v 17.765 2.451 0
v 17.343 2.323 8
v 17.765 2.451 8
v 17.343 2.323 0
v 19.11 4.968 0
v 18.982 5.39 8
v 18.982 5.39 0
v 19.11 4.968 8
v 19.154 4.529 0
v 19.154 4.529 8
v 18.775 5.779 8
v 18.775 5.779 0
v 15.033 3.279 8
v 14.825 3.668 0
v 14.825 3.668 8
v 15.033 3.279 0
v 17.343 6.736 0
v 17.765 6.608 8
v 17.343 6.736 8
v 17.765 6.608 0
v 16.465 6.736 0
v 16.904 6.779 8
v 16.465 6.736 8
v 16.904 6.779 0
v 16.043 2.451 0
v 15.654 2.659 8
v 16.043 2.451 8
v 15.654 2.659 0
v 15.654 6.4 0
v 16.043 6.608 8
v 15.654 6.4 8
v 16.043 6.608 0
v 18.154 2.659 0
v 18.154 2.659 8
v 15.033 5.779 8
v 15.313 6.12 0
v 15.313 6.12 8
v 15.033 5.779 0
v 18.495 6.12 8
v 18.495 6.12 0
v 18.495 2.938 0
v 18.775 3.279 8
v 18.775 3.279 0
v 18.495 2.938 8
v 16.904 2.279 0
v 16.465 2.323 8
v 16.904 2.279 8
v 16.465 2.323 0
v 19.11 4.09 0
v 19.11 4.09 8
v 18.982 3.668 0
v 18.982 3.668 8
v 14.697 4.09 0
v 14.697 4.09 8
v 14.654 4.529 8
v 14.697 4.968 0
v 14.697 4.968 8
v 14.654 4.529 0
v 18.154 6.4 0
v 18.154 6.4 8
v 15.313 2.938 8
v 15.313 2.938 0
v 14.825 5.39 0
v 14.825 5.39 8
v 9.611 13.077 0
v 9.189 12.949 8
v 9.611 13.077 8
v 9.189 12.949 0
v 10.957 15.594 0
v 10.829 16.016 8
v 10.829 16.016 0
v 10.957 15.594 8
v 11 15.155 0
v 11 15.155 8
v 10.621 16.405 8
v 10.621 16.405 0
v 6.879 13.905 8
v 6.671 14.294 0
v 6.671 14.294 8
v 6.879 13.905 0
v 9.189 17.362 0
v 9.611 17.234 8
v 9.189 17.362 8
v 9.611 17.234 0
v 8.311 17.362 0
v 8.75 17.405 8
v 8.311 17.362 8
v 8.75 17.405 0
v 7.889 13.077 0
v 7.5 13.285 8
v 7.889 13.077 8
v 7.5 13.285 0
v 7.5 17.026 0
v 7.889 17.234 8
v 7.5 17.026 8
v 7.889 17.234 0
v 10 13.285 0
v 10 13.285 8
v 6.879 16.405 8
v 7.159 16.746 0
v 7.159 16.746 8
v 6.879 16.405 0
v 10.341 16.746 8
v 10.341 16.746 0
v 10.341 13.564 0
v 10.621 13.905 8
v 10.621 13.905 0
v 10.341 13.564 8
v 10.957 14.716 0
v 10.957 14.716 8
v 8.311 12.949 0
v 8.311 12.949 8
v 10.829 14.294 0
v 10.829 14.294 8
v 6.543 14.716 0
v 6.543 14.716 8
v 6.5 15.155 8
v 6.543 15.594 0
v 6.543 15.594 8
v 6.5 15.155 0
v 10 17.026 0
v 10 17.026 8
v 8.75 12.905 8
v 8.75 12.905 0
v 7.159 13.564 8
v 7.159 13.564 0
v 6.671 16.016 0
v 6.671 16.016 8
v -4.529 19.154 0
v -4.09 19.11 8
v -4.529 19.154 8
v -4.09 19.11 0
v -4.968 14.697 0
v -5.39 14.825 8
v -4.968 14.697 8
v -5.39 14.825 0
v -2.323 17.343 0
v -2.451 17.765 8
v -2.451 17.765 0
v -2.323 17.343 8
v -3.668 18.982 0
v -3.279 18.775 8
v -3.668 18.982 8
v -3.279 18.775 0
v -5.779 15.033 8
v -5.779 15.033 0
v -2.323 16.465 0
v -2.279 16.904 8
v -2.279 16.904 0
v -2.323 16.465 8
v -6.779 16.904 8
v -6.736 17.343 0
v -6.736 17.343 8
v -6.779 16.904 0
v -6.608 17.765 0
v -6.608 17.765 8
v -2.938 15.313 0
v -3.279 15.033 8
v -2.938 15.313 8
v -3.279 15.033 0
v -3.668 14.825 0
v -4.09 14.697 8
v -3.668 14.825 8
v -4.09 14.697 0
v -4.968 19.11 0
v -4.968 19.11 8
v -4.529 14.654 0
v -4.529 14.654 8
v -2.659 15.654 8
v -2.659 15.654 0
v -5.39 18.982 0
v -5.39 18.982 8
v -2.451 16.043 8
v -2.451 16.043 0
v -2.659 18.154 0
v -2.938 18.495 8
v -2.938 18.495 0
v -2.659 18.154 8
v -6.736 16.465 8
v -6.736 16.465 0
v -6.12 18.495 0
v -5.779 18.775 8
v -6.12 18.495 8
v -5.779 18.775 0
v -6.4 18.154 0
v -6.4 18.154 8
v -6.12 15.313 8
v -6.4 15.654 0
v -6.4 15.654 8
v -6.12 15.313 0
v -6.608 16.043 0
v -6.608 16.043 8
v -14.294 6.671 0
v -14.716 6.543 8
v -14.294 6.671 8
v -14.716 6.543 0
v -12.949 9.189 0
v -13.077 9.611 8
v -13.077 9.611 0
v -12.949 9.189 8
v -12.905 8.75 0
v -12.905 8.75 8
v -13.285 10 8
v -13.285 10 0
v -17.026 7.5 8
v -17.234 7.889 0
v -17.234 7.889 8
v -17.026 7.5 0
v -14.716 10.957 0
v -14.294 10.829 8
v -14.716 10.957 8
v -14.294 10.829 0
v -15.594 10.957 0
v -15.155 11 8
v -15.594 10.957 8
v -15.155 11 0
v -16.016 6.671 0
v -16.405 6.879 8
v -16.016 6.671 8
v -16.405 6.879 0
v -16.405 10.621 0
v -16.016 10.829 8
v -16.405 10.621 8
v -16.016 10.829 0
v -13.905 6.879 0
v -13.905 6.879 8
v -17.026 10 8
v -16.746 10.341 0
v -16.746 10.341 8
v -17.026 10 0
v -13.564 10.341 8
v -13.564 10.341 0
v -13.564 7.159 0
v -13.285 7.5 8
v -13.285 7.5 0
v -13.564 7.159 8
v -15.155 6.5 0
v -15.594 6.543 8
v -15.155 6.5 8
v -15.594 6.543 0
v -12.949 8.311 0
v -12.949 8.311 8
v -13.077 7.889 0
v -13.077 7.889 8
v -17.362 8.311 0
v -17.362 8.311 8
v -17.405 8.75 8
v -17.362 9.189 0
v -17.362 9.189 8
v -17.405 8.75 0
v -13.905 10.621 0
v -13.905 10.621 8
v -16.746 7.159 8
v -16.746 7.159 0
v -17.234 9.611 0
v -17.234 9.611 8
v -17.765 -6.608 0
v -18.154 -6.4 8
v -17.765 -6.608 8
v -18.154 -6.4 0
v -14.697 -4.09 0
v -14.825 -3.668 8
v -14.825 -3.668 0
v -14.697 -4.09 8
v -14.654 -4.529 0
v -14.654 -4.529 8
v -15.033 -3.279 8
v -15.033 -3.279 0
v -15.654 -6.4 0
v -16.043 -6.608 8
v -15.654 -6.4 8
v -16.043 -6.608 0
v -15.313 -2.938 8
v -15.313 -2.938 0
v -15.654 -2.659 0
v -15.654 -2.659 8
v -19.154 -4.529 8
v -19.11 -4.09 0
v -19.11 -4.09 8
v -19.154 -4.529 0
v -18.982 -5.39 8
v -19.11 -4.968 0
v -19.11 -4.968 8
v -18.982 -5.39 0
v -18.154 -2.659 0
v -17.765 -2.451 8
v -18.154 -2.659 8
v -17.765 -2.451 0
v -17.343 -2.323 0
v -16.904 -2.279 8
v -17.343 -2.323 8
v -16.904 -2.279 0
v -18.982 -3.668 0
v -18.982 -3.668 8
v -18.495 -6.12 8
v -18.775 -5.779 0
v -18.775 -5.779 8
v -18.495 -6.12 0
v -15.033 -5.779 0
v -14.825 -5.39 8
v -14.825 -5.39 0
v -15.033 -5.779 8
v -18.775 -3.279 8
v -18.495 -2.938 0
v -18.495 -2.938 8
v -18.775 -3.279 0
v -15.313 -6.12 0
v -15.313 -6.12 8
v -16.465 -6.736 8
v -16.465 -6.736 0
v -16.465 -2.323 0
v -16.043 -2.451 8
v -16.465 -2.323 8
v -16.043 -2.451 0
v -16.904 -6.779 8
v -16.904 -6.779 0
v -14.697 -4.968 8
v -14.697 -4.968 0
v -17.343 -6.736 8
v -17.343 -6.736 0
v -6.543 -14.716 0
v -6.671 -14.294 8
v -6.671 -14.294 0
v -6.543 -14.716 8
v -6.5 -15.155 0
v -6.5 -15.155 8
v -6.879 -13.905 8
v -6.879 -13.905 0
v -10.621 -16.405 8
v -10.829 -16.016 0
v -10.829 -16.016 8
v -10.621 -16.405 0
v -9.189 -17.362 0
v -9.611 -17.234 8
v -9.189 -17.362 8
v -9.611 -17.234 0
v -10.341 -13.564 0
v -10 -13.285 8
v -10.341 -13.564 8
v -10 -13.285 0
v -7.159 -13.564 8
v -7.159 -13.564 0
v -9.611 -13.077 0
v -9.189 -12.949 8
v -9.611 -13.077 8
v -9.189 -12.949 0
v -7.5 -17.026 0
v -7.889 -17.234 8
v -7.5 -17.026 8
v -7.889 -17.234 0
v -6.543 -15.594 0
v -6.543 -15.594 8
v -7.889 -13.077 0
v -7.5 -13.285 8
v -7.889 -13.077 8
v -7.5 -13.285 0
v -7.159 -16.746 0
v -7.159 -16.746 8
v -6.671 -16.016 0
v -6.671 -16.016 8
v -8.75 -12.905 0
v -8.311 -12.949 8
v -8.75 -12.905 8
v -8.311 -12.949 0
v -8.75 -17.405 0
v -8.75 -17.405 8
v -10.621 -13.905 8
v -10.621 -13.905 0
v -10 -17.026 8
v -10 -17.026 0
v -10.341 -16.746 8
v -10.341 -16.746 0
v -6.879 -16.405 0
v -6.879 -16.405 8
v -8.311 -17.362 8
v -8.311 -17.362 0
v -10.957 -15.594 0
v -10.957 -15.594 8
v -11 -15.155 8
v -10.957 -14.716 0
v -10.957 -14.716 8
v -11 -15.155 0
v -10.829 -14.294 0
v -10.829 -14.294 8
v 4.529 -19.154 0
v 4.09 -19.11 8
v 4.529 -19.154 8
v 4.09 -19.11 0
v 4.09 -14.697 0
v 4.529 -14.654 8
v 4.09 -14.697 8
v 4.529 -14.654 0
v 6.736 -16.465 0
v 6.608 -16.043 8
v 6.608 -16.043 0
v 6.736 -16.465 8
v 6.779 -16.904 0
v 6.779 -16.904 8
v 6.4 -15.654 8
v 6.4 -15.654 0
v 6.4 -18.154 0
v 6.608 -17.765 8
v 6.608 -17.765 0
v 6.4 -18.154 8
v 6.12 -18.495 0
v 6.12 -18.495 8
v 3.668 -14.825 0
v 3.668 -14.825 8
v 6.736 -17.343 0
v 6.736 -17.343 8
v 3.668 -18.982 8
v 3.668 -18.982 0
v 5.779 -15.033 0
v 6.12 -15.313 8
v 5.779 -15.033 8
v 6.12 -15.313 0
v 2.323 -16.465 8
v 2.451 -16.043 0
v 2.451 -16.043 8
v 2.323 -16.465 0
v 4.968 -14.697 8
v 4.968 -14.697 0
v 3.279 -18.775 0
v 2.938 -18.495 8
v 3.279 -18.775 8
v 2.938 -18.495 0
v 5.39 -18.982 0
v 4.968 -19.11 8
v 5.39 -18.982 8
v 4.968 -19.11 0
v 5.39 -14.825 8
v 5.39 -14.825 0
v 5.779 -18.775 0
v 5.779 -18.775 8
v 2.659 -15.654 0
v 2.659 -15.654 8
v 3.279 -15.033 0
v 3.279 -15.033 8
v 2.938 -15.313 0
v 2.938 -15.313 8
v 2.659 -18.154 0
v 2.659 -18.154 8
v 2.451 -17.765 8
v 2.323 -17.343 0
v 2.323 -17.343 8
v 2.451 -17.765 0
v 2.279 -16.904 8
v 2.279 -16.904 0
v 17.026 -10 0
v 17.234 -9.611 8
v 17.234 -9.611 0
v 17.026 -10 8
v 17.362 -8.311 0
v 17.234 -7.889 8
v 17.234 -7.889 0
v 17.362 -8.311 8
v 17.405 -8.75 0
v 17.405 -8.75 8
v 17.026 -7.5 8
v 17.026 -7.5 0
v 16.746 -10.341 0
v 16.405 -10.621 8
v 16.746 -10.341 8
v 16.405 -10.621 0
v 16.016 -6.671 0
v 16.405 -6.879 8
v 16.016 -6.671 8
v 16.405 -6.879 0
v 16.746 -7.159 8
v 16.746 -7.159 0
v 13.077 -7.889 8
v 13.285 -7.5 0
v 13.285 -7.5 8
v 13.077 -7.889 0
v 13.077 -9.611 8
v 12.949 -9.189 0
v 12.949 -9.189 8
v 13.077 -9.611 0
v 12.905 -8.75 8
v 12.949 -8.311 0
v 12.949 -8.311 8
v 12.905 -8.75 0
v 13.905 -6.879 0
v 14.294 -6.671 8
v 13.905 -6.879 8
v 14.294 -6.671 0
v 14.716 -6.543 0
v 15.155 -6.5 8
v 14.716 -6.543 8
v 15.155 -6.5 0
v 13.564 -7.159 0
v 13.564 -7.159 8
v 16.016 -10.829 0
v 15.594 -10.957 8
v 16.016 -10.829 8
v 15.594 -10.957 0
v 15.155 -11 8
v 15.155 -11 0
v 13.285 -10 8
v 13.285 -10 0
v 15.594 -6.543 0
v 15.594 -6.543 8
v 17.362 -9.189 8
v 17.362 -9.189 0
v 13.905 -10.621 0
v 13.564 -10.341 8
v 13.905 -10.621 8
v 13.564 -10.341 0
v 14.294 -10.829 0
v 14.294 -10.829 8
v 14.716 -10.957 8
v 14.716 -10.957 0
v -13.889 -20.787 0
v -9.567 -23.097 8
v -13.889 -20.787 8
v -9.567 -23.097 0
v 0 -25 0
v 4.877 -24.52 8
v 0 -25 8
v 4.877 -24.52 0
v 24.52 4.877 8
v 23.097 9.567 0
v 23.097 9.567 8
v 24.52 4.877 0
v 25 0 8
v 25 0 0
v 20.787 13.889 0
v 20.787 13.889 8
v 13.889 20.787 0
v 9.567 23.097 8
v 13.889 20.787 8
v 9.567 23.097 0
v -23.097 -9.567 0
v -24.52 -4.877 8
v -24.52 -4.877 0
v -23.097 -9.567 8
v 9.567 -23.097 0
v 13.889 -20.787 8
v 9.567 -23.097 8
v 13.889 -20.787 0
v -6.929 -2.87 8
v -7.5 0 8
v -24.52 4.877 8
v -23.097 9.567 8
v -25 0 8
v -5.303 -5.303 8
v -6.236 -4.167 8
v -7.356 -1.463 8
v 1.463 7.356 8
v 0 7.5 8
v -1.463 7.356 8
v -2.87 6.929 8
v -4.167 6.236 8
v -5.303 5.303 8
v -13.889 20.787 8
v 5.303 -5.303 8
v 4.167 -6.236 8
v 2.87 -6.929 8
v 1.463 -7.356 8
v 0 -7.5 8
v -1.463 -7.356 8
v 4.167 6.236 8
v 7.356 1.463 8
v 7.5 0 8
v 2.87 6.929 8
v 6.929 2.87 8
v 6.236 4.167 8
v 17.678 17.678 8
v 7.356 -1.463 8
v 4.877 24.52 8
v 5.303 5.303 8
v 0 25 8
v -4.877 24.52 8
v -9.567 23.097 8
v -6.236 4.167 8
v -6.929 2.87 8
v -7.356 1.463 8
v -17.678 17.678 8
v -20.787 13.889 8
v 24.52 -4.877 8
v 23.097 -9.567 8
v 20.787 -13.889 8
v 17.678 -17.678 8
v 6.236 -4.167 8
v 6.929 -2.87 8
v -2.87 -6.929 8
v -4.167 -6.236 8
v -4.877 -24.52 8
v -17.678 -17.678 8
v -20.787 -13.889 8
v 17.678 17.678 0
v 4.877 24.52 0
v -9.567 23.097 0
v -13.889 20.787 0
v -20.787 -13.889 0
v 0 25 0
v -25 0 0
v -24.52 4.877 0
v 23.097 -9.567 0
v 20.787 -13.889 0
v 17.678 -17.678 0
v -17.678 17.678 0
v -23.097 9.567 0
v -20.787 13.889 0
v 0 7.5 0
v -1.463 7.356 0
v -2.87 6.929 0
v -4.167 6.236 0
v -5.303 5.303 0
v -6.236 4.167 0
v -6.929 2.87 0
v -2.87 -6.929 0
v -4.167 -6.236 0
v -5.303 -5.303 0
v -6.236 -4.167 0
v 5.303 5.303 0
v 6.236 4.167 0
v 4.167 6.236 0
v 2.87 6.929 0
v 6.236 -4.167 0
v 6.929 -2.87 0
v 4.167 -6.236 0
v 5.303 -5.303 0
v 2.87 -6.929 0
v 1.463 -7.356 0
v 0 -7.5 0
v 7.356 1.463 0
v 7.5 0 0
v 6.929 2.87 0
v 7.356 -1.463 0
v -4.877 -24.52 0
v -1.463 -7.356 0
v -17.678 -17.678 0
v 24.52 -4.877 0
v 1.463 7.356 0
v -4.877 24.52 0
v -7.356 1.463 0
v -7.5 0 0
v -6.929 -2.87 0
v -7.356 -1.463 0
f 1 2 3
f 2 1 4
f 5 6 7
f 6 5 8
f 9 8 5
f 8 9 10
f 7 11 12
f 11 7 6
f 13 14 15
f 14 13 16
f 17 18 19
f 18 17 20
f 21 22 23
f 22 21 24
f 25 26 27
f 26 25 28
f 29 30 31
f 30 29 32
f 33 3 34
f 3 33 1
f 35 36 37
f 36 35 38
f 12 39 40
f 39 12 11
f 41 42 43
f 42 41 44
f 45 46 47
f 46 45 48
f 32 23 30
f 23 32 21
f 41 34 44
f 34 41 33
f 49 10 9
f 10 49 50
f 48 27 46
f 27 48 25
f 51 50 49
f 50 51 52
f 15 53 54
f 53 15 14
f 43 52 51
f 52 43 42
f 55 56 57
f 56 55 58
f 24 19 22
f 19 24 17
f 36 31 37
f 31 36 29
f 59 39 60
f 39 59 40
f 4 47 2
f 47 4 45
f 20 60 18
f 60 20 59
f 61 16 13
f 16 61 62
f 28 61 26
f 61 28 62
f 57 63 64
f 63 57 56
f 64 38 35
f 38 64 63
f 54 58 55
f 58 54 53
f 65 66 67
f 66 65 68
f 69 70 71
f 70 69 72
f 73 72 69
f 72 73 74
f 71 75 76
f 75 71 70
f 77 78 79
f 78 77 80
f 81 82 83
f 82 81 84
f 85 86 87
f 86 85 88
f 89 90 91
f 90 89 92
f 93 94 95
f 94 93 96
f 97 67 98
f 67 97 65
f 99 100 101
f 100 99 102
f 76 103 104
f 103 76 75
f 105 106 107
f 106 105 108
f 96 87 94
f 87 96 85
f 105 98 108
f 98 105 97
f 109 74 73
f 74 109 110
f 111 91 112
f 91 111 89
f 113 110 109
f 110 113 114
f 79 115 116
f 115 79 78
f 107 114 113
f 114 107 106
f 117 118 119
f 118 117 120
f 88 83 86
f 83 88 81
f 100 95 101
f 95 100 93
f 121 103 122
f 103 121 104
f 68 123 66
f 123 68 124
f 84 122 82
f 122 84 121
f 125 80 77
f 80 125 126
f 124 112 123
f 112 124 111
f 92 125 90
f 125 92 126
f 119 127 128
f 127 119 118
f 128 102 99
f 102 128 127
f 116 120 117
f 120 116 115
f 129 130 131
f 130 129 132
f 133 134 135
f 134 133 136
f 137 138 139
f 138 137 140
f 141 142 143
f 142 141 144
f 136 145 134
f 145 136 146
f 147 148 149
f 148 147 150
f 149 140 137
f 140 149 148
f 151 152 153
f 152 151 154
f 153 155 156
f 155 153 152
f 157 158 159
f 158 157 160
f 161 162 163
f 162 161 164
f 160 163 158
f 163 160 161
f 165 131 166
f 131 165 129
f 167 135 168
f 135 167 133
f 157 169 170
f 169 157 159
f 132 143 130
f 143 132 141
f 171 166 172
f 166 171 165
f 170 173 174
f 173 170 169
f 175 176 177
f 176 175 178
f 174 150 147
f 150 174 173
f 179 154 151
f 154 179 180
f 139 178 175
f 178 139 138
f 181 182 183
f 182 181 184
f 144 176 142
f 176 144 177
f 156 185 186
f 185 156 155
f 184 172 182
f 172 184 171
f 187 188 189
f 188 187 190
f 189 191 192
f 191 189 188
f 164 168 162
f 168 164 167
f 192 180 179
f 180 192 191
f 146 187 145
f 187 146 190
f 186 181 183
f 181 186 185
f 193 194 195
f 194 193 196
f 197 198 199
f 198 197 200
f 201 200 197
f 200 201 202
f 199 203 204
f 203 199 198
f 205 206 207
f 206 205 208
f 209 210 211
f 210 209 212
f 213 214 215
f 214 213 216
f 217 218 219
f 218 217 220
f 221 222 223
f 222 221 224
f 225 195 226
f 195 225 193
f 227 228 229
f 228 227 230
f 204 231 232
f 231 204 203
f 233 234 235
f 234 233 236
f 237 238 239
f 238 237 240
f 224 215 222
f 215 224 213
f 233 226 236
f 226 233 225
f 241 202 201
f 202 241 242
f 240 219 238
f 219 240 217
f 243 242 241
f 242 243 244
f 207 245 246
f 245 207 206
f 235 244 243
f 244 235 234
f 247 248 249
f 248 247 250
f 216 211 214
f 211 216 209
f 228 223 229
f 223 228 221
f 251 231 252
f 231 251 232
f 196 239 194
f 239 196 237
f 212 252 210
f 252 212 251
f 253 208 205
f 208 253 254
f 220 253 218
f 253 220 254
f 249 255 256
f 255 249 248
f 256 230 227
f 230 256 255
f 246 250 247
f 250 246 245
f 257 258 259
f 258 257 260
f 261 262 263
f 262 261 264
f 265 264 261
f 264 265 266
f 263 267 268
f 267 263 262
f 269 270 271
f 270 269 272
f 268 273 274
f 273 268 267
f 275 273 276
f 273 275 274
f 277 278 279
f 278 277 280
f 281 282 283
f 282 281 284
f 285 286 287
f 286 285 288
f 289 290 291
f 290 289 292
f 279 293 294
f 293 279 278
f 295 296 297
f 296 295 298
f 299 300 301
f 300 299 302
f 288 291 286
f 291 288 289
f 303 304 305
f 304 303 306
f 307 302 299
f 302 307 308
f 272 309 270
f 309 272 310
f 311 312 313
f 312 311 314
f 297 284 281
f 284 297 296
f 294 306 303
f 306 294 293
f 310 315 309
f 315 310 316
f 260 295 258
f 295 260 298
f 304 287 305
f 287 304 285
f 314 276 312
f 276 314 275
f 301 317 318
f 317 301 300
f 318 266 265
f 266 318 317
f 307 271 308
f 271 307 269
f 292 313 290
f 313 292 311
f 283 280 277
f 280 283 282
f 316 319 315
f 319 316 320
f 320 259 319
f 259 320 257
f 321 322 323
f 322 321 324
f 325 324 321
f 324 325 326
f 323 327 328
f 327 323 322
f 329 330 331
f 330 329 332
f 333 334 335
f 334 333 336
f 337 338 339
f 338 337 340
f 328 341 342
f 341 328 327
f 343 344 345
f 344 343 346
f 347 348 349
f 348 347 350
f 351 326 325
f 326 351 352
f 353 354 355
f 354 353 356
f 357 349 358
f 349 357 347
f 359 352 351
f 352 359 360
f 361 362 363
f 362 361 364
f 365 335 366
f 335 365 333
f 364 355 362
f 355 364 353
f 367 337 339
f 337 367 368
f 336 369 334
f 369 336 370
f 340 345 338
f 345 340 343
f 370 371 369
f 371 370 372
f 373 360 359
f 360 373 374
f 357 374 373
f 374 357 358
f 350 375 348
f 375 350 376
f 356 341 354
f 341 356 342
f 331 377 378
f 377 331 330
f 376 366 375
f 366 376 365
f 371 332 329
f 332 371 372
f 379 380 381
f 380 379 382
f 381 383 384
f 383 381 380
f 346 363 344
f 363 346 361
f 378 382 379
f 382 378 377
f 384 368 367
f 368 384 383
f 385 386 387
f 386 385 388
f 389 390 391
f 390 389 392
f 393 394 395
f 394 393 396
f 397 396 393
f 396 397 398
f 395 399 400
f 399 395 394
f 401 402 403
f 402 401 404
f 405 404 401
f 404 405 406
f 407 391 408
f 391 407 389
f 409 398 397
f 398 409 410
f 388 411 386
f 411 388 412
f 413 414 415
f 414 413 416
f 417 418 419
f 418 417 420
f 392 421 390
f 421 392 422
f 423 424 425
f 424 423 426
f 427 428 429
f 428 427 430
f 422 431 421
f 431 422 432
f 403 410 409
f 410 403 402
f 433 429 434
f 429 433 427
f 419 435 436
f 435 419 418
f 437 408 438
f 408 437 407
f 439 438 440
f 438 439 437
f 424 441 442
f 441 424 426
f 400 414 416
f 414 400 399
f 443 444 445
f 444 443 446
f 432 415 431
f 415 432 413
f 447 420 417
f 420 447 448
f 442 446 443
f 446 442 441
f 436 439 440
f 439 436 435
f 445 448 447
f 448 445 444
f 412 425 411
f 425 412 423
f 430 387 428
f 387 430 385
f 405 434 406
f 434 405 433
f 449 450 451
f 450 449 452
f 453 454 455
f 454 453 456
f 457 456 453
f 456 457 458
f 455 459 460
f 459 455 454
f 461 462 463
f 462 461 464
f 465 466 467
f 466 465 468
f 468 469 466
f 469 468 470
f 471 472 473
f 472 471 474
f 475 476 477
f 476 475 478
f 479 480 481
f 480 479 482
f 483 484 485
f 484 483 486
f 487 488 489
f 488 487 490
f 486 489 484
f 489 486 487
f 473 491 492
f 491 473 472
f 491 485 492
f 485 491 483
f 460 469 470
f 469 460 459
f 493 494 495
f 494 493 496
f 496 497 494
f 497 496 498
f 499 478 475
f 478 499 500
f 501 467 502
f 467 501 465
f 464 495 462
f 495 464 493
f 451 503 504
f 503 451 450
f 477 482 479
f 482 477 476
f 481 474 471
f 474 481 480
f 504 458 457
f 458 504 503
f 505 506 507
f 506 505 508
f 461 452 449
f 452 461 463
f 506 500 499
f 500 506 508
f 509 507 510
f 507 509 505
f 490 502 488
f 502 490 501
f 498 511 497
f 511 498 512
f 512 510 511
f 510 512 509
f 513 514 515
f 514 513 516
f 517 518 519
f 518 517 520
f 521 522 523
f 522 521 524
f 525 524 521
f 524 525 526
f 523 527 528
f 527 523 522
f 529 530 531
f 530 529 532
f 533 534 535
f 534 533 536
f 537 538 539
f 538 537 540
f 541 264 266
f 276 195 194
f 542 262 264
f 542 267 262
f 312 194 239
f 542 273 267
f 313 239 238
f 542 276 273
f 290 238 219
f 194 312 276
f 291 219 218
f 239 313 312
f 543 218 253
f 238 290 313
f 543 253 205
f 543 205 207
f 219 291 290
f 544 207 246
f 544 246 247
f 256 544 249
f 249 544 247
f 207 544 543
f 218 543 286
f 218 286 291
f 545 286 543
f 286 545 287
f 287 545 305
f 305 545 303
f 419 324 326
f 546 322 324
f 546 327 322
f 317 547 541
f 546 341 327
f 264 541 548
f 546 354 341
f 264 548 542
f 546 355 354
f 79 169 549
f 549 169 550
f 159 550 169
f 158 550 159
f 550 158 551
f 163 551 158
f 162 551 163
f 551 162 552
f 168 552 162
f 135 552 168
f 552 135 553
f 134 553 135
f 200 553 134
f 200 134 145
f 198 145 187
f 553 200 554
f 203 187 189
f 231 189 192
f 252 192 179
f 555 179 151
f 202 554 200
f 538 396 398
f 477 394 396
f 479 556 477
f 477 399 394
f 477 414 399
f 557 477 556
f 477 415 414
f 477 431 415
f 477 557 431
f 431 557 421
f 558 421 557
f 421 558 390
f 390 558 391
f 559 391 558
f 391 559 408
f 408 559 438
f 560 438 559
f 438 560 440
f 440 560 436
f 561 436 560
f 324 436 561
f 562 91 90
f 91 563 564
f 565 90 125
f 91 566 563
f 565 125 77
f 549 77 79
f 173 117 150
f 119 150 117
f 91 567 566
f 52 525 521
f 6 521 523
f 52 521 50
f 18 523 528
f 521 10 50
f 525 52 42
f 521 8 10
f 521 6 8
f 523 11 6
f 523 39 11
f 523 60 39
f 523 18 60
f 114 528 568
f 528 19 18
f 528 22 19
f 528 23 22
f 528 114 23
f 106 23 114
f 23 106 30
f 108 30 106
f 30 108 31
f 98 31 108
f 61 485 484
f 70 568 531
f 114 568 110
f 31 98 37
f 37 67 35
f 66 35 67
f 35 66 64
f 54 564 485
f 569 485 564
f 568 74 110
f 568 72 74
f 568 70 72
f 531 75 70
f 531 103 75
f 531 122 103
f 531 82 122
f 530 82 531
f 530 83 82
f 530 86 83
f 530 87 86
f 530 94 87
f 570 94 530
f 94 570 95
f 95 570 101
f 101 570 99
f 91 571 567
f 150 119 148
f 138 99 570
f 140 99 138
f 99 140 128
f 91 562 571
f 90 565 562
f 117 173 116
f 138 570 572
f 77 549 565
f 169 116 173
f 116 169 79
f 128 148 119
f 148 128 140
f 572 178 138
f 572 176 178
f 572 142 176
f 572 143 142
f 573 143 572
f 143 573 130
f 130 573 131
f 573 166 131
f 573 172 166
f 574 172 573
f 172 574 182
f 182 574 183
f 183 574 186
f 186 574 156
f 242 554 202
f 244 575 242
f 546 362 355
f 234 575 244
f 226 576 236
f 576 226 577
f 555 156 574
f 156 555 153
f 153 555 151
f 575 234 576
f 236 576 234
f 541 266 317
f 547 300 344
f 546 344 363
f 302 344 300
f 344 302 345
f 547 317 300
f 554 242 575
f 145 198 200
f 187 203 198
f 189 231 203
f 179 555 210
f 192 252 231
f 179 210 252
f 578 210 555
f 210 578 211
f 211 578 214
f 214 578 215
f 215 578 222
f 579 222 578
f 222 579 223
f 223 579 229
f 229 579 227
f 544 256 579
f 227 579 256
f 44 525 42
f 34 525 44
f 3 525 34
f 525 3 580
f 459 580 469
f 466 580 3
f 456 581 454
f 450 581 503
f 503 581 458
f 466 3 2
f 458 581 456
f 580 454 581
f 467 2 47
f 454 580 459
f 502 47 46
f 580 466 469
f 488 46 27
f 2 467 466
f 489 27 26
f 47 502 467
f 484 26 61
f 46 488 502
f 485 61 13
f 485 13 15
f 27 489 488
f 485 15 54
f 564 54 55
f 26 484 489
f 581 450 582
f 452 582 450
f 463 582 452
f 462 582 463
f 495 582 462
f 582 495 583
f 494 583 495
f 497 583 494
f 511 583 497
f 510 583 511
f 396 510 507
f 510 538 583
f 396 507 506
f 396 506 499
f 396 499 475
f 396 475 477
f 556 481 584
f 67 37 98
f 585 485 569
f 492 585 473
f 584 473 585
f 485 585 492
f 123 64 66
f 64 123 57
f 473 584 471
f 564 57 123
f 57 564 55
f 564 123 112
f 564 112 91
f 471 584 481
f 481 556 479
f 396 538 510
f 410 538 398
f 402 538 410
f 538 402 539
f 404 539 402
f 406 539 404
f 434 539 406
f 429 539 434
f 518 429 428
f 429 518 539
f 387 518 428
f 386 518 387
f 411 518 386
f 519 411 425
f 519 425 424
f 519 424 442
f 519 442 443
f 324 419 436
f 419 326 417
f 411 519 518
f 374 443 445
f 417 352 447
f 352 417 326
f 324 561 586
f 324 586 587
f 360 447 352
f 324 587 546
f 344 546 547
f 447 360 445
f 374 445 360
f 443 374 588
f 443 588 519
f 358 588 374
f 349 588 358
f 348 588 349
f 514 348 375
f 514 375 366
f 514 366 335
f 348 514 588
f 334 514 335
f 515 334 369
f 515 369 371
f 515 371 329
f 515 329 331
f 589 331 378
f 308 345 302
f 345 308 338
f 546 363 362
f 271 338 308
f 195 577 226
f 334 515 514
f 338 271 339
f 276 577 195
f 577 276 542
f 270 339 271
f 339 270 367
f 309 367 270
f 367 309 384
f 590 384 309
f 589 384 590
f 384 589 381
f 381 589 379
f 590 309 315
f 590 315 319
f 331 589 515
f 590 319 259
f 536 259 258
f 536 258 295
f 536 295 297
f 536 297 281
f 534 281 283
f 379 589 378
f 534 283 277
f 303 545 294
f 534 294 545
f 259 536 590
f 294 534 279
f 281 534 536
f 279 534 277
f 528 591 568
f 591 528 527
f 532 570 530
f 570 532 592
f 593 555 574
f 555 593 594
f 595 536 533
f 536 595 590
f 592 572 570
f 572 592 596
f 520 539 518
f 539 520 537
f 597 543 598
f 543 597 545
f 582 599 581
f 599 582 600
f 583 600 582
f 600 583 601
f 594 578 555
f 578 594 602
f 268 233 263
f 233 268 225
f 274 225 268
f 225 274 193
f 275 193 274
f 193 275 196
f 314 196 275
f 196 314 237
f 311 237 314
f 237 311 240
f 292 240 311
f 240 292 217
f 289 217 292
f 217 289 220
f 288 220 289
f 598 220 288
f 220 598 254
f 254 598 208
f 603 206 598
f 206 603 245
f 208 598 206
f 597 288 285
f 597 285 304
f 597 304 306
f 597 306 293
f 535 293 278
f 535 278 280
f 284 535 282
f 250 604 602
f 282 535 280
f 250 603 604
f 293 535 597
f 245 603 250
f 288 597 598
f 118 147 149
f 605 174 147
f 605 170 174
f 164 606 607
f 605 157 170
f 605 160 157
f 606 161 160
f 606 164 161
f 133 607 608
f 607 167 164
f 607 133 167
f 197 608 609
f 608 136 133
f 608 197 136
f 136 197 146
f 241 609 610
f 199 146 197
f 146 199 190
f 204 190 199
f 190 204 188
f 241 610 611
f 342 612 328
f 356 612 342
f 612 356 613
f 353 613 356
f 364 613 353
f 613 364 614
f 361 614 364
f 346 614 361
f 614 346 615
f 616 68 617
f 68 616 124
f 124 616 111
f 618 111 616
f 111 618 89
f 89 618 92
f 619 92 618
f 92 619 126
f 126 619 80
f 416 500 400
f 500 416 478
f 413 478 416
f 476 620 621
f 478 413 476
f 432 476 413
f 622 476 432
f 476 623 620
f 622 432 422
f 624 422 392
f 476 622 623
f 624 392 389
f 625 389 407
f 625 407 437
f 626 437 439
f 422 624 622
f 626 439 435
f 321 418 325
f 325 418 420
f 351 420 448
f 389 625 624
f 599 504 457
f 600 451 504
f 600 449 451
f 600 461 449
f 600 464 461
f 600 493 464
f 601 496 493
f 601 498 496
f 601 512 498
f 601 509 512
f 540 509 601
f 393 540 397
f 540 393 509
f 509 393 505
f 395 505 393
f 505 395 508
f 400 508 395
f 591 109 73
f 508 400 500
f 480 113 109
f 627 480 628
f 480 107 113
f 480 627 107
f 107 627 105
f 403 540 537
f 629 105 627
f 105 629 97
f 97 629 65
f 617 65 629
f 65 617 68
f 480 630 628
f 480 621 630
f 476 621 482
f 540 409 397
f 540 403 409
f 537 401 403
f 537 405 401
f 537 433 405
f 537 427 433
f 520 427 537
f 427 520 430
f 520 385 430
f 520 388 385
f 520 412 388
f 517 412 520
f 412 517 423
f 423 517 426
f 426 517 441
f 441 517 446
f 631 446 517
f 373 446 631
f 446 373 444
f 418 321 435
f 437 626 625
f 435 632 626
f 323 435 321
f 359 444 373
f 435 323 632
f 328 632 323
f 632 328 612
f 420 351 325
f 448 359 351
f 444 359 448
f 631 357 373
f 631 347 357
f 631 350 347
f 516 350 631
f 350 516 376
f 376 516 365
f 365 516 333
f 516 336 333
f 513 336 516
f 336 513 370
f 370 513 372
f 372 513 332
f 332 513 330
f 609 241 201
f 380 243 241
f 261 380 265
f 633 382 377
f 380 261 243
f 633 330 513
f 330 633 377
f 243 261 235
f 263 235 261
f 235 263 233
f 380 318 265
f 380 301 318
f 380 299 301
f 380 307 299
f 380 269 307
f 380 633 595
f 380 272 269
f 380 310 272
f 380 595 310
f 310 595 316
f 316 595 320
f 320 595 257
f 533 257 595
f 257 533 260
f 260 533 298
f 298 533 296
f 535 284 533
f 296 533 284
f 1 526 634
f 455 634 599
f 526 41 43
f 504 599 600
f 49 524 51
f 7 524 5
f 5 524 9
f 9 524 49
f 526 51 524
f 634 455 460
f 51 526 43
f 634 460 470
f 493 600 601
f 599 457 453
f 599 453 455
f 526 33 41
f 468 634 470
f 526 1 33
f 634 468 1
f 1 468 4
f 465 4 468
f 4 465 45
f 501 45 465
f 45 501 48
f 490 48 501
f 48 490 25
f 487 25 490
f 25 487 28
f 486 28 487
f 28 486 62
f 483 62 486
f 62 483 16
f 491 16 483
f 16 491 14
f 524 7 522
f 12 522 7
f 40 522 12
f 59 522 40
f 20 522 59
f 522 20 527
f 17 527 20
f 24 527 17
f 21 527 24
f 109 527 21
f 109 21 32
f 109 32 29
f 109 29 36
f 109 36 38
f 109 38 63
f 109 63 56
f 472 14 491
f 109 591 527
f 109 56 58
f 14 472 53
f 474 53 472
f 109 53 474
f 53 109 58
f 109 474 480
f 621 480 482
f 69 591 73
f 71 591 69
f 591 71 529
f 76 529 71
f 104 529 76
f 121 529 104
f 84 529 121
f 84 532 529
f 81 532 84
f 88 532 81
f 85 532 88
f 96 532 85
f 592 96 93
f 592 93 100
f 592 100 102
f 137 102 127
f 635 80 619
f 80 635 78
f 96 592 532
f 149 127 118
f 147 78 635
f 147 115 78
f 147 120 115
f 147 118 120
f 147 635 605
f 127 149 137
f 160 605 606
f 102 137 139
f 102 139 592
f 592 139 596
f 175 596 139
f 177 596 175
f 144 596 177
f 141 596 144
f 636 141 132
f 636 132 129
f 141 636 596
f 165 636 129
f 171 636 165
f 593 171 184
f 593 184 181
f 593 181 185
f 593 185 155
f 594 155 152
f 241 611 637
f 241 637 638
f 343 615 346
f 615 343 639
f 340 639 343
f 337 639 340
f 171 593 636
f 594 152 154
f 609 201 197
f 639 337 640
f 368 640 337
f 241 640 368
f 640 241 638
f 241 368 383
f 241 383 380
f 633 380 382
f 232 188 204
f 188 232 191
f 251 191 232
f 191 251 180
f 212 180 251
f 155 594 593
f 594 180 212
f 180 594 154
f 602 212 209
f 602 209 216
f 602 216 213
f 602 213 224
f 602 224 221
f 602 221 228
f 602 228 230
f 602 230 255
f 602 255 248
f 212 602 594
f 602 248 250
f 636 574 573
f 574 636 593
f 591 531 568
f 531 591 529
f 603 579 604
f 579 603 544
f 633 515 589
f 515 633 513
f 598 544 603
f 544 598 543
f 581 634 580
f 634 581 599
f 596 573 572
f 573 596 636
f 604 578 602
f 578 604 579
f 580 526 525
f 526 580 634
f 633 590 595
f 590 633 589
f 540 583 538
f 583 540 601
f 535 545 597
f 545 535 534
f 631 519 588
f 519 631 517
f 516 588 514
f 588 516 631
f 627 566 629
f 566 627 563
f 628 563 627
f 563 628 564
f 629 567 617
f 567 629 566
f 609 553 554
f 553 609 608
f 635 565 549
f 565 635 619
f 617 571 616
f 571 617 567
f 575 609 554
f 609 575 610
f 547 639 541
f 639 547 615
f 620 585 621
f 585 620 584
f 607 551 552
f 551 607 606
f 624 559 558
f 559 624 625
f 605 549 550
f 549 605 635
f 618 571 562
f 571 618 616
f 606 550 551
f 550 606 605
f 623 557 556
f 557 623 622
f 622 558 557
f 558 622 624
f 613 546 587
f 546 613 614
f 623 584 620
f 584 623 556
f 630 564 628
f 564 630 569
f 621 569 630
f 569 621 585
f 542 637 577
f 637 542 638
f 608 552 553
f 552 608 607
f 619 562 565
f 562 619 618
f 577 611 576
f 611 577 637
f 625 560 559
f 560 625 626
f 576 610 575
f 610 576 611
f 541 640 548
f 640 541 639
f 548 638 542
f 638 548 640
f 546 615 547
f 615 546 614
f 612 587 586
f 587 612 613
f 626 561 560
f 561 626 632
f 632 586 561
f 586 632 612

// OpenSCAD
$fn = 32;

// ----------------------------------------------------------------------
// Flange Ø50 x 8
// 8 holes on a Ø35 bolt circle, bolted joints
// ----------------------------------------------------------------------

// --- parameters (mm) ---
flange_d = 50;   // outside diameter of the flange
thickness = 8;   // flange thickness
holes = 8;       // number of bolt holes
pcd = 35;        // bolt circle diameter
start_deg = 15;  // angle of the first hole, from +X
hole_d = 4.5;    // bolt hole diameter
bore_d = 15;     // central through bore
hub_d = 25;      // hub outside diameter
hub_h = 0;       // hub height above the flange face (0 = no hub)

// --- derived feature positions (mm) ---
height = thickness + hub_h;  // = 8   overall height of the part
pcd_r = pcd / 2;             // = 17.5   bolt circle radius
hole_step = 360 / holes;     // = 45   angular pitch
feature_centers = [
  [pcd_r * cos(start_deg + 0 * hole_step), pcd_r * sin(start_deg + 0 * hole_step)],
  [pcd_r * cos(start_deg + 1 * hole_step), pcd_r * sin(start_deg + 1 * hole_step)],
  [pcd_r * cos(start_deg + 2 * hole_step), pcd_r * sin(start_deg + 2 * hole_step)],
  [pcd_r * cos(start_deg + 3 * hole_step), pcd_r * sin(start_deg + 3 * hole_step)],
  [pcd_r * cos(start_deg + 4 * hole_step), pcd_r * sin(start_deg + 4 * hole_step)],
  [pcd_r * cos(start_deg + 5 * hole_step), pcd_r * sin(start_deg + 5 * hole_step)],
  [pcd_r * cos(start_deg + 6 * hole_step), pcd_r * sin(start_deg + 6 * hole_step)],
  [pcd_r * cos(start_deg + 7 * hole_step), pcd_r * sin(start_deg + 7 * hole_step)]
];   // bolt hole centres on the pitch circle

// flange disc, every hole and the bore cut straight through
difference() {
  union() {
    cylinder(d = flange_d, h = thickness);
  }
  translate([0, 0, -1]) cylinder(d = bore_d, h = height + 2);  // bore, through
  for (centre = feature_centers)
    translate([centre[0], centre[1], -1]) cylinder(d = hole_d, h = thickness + 2);
}
